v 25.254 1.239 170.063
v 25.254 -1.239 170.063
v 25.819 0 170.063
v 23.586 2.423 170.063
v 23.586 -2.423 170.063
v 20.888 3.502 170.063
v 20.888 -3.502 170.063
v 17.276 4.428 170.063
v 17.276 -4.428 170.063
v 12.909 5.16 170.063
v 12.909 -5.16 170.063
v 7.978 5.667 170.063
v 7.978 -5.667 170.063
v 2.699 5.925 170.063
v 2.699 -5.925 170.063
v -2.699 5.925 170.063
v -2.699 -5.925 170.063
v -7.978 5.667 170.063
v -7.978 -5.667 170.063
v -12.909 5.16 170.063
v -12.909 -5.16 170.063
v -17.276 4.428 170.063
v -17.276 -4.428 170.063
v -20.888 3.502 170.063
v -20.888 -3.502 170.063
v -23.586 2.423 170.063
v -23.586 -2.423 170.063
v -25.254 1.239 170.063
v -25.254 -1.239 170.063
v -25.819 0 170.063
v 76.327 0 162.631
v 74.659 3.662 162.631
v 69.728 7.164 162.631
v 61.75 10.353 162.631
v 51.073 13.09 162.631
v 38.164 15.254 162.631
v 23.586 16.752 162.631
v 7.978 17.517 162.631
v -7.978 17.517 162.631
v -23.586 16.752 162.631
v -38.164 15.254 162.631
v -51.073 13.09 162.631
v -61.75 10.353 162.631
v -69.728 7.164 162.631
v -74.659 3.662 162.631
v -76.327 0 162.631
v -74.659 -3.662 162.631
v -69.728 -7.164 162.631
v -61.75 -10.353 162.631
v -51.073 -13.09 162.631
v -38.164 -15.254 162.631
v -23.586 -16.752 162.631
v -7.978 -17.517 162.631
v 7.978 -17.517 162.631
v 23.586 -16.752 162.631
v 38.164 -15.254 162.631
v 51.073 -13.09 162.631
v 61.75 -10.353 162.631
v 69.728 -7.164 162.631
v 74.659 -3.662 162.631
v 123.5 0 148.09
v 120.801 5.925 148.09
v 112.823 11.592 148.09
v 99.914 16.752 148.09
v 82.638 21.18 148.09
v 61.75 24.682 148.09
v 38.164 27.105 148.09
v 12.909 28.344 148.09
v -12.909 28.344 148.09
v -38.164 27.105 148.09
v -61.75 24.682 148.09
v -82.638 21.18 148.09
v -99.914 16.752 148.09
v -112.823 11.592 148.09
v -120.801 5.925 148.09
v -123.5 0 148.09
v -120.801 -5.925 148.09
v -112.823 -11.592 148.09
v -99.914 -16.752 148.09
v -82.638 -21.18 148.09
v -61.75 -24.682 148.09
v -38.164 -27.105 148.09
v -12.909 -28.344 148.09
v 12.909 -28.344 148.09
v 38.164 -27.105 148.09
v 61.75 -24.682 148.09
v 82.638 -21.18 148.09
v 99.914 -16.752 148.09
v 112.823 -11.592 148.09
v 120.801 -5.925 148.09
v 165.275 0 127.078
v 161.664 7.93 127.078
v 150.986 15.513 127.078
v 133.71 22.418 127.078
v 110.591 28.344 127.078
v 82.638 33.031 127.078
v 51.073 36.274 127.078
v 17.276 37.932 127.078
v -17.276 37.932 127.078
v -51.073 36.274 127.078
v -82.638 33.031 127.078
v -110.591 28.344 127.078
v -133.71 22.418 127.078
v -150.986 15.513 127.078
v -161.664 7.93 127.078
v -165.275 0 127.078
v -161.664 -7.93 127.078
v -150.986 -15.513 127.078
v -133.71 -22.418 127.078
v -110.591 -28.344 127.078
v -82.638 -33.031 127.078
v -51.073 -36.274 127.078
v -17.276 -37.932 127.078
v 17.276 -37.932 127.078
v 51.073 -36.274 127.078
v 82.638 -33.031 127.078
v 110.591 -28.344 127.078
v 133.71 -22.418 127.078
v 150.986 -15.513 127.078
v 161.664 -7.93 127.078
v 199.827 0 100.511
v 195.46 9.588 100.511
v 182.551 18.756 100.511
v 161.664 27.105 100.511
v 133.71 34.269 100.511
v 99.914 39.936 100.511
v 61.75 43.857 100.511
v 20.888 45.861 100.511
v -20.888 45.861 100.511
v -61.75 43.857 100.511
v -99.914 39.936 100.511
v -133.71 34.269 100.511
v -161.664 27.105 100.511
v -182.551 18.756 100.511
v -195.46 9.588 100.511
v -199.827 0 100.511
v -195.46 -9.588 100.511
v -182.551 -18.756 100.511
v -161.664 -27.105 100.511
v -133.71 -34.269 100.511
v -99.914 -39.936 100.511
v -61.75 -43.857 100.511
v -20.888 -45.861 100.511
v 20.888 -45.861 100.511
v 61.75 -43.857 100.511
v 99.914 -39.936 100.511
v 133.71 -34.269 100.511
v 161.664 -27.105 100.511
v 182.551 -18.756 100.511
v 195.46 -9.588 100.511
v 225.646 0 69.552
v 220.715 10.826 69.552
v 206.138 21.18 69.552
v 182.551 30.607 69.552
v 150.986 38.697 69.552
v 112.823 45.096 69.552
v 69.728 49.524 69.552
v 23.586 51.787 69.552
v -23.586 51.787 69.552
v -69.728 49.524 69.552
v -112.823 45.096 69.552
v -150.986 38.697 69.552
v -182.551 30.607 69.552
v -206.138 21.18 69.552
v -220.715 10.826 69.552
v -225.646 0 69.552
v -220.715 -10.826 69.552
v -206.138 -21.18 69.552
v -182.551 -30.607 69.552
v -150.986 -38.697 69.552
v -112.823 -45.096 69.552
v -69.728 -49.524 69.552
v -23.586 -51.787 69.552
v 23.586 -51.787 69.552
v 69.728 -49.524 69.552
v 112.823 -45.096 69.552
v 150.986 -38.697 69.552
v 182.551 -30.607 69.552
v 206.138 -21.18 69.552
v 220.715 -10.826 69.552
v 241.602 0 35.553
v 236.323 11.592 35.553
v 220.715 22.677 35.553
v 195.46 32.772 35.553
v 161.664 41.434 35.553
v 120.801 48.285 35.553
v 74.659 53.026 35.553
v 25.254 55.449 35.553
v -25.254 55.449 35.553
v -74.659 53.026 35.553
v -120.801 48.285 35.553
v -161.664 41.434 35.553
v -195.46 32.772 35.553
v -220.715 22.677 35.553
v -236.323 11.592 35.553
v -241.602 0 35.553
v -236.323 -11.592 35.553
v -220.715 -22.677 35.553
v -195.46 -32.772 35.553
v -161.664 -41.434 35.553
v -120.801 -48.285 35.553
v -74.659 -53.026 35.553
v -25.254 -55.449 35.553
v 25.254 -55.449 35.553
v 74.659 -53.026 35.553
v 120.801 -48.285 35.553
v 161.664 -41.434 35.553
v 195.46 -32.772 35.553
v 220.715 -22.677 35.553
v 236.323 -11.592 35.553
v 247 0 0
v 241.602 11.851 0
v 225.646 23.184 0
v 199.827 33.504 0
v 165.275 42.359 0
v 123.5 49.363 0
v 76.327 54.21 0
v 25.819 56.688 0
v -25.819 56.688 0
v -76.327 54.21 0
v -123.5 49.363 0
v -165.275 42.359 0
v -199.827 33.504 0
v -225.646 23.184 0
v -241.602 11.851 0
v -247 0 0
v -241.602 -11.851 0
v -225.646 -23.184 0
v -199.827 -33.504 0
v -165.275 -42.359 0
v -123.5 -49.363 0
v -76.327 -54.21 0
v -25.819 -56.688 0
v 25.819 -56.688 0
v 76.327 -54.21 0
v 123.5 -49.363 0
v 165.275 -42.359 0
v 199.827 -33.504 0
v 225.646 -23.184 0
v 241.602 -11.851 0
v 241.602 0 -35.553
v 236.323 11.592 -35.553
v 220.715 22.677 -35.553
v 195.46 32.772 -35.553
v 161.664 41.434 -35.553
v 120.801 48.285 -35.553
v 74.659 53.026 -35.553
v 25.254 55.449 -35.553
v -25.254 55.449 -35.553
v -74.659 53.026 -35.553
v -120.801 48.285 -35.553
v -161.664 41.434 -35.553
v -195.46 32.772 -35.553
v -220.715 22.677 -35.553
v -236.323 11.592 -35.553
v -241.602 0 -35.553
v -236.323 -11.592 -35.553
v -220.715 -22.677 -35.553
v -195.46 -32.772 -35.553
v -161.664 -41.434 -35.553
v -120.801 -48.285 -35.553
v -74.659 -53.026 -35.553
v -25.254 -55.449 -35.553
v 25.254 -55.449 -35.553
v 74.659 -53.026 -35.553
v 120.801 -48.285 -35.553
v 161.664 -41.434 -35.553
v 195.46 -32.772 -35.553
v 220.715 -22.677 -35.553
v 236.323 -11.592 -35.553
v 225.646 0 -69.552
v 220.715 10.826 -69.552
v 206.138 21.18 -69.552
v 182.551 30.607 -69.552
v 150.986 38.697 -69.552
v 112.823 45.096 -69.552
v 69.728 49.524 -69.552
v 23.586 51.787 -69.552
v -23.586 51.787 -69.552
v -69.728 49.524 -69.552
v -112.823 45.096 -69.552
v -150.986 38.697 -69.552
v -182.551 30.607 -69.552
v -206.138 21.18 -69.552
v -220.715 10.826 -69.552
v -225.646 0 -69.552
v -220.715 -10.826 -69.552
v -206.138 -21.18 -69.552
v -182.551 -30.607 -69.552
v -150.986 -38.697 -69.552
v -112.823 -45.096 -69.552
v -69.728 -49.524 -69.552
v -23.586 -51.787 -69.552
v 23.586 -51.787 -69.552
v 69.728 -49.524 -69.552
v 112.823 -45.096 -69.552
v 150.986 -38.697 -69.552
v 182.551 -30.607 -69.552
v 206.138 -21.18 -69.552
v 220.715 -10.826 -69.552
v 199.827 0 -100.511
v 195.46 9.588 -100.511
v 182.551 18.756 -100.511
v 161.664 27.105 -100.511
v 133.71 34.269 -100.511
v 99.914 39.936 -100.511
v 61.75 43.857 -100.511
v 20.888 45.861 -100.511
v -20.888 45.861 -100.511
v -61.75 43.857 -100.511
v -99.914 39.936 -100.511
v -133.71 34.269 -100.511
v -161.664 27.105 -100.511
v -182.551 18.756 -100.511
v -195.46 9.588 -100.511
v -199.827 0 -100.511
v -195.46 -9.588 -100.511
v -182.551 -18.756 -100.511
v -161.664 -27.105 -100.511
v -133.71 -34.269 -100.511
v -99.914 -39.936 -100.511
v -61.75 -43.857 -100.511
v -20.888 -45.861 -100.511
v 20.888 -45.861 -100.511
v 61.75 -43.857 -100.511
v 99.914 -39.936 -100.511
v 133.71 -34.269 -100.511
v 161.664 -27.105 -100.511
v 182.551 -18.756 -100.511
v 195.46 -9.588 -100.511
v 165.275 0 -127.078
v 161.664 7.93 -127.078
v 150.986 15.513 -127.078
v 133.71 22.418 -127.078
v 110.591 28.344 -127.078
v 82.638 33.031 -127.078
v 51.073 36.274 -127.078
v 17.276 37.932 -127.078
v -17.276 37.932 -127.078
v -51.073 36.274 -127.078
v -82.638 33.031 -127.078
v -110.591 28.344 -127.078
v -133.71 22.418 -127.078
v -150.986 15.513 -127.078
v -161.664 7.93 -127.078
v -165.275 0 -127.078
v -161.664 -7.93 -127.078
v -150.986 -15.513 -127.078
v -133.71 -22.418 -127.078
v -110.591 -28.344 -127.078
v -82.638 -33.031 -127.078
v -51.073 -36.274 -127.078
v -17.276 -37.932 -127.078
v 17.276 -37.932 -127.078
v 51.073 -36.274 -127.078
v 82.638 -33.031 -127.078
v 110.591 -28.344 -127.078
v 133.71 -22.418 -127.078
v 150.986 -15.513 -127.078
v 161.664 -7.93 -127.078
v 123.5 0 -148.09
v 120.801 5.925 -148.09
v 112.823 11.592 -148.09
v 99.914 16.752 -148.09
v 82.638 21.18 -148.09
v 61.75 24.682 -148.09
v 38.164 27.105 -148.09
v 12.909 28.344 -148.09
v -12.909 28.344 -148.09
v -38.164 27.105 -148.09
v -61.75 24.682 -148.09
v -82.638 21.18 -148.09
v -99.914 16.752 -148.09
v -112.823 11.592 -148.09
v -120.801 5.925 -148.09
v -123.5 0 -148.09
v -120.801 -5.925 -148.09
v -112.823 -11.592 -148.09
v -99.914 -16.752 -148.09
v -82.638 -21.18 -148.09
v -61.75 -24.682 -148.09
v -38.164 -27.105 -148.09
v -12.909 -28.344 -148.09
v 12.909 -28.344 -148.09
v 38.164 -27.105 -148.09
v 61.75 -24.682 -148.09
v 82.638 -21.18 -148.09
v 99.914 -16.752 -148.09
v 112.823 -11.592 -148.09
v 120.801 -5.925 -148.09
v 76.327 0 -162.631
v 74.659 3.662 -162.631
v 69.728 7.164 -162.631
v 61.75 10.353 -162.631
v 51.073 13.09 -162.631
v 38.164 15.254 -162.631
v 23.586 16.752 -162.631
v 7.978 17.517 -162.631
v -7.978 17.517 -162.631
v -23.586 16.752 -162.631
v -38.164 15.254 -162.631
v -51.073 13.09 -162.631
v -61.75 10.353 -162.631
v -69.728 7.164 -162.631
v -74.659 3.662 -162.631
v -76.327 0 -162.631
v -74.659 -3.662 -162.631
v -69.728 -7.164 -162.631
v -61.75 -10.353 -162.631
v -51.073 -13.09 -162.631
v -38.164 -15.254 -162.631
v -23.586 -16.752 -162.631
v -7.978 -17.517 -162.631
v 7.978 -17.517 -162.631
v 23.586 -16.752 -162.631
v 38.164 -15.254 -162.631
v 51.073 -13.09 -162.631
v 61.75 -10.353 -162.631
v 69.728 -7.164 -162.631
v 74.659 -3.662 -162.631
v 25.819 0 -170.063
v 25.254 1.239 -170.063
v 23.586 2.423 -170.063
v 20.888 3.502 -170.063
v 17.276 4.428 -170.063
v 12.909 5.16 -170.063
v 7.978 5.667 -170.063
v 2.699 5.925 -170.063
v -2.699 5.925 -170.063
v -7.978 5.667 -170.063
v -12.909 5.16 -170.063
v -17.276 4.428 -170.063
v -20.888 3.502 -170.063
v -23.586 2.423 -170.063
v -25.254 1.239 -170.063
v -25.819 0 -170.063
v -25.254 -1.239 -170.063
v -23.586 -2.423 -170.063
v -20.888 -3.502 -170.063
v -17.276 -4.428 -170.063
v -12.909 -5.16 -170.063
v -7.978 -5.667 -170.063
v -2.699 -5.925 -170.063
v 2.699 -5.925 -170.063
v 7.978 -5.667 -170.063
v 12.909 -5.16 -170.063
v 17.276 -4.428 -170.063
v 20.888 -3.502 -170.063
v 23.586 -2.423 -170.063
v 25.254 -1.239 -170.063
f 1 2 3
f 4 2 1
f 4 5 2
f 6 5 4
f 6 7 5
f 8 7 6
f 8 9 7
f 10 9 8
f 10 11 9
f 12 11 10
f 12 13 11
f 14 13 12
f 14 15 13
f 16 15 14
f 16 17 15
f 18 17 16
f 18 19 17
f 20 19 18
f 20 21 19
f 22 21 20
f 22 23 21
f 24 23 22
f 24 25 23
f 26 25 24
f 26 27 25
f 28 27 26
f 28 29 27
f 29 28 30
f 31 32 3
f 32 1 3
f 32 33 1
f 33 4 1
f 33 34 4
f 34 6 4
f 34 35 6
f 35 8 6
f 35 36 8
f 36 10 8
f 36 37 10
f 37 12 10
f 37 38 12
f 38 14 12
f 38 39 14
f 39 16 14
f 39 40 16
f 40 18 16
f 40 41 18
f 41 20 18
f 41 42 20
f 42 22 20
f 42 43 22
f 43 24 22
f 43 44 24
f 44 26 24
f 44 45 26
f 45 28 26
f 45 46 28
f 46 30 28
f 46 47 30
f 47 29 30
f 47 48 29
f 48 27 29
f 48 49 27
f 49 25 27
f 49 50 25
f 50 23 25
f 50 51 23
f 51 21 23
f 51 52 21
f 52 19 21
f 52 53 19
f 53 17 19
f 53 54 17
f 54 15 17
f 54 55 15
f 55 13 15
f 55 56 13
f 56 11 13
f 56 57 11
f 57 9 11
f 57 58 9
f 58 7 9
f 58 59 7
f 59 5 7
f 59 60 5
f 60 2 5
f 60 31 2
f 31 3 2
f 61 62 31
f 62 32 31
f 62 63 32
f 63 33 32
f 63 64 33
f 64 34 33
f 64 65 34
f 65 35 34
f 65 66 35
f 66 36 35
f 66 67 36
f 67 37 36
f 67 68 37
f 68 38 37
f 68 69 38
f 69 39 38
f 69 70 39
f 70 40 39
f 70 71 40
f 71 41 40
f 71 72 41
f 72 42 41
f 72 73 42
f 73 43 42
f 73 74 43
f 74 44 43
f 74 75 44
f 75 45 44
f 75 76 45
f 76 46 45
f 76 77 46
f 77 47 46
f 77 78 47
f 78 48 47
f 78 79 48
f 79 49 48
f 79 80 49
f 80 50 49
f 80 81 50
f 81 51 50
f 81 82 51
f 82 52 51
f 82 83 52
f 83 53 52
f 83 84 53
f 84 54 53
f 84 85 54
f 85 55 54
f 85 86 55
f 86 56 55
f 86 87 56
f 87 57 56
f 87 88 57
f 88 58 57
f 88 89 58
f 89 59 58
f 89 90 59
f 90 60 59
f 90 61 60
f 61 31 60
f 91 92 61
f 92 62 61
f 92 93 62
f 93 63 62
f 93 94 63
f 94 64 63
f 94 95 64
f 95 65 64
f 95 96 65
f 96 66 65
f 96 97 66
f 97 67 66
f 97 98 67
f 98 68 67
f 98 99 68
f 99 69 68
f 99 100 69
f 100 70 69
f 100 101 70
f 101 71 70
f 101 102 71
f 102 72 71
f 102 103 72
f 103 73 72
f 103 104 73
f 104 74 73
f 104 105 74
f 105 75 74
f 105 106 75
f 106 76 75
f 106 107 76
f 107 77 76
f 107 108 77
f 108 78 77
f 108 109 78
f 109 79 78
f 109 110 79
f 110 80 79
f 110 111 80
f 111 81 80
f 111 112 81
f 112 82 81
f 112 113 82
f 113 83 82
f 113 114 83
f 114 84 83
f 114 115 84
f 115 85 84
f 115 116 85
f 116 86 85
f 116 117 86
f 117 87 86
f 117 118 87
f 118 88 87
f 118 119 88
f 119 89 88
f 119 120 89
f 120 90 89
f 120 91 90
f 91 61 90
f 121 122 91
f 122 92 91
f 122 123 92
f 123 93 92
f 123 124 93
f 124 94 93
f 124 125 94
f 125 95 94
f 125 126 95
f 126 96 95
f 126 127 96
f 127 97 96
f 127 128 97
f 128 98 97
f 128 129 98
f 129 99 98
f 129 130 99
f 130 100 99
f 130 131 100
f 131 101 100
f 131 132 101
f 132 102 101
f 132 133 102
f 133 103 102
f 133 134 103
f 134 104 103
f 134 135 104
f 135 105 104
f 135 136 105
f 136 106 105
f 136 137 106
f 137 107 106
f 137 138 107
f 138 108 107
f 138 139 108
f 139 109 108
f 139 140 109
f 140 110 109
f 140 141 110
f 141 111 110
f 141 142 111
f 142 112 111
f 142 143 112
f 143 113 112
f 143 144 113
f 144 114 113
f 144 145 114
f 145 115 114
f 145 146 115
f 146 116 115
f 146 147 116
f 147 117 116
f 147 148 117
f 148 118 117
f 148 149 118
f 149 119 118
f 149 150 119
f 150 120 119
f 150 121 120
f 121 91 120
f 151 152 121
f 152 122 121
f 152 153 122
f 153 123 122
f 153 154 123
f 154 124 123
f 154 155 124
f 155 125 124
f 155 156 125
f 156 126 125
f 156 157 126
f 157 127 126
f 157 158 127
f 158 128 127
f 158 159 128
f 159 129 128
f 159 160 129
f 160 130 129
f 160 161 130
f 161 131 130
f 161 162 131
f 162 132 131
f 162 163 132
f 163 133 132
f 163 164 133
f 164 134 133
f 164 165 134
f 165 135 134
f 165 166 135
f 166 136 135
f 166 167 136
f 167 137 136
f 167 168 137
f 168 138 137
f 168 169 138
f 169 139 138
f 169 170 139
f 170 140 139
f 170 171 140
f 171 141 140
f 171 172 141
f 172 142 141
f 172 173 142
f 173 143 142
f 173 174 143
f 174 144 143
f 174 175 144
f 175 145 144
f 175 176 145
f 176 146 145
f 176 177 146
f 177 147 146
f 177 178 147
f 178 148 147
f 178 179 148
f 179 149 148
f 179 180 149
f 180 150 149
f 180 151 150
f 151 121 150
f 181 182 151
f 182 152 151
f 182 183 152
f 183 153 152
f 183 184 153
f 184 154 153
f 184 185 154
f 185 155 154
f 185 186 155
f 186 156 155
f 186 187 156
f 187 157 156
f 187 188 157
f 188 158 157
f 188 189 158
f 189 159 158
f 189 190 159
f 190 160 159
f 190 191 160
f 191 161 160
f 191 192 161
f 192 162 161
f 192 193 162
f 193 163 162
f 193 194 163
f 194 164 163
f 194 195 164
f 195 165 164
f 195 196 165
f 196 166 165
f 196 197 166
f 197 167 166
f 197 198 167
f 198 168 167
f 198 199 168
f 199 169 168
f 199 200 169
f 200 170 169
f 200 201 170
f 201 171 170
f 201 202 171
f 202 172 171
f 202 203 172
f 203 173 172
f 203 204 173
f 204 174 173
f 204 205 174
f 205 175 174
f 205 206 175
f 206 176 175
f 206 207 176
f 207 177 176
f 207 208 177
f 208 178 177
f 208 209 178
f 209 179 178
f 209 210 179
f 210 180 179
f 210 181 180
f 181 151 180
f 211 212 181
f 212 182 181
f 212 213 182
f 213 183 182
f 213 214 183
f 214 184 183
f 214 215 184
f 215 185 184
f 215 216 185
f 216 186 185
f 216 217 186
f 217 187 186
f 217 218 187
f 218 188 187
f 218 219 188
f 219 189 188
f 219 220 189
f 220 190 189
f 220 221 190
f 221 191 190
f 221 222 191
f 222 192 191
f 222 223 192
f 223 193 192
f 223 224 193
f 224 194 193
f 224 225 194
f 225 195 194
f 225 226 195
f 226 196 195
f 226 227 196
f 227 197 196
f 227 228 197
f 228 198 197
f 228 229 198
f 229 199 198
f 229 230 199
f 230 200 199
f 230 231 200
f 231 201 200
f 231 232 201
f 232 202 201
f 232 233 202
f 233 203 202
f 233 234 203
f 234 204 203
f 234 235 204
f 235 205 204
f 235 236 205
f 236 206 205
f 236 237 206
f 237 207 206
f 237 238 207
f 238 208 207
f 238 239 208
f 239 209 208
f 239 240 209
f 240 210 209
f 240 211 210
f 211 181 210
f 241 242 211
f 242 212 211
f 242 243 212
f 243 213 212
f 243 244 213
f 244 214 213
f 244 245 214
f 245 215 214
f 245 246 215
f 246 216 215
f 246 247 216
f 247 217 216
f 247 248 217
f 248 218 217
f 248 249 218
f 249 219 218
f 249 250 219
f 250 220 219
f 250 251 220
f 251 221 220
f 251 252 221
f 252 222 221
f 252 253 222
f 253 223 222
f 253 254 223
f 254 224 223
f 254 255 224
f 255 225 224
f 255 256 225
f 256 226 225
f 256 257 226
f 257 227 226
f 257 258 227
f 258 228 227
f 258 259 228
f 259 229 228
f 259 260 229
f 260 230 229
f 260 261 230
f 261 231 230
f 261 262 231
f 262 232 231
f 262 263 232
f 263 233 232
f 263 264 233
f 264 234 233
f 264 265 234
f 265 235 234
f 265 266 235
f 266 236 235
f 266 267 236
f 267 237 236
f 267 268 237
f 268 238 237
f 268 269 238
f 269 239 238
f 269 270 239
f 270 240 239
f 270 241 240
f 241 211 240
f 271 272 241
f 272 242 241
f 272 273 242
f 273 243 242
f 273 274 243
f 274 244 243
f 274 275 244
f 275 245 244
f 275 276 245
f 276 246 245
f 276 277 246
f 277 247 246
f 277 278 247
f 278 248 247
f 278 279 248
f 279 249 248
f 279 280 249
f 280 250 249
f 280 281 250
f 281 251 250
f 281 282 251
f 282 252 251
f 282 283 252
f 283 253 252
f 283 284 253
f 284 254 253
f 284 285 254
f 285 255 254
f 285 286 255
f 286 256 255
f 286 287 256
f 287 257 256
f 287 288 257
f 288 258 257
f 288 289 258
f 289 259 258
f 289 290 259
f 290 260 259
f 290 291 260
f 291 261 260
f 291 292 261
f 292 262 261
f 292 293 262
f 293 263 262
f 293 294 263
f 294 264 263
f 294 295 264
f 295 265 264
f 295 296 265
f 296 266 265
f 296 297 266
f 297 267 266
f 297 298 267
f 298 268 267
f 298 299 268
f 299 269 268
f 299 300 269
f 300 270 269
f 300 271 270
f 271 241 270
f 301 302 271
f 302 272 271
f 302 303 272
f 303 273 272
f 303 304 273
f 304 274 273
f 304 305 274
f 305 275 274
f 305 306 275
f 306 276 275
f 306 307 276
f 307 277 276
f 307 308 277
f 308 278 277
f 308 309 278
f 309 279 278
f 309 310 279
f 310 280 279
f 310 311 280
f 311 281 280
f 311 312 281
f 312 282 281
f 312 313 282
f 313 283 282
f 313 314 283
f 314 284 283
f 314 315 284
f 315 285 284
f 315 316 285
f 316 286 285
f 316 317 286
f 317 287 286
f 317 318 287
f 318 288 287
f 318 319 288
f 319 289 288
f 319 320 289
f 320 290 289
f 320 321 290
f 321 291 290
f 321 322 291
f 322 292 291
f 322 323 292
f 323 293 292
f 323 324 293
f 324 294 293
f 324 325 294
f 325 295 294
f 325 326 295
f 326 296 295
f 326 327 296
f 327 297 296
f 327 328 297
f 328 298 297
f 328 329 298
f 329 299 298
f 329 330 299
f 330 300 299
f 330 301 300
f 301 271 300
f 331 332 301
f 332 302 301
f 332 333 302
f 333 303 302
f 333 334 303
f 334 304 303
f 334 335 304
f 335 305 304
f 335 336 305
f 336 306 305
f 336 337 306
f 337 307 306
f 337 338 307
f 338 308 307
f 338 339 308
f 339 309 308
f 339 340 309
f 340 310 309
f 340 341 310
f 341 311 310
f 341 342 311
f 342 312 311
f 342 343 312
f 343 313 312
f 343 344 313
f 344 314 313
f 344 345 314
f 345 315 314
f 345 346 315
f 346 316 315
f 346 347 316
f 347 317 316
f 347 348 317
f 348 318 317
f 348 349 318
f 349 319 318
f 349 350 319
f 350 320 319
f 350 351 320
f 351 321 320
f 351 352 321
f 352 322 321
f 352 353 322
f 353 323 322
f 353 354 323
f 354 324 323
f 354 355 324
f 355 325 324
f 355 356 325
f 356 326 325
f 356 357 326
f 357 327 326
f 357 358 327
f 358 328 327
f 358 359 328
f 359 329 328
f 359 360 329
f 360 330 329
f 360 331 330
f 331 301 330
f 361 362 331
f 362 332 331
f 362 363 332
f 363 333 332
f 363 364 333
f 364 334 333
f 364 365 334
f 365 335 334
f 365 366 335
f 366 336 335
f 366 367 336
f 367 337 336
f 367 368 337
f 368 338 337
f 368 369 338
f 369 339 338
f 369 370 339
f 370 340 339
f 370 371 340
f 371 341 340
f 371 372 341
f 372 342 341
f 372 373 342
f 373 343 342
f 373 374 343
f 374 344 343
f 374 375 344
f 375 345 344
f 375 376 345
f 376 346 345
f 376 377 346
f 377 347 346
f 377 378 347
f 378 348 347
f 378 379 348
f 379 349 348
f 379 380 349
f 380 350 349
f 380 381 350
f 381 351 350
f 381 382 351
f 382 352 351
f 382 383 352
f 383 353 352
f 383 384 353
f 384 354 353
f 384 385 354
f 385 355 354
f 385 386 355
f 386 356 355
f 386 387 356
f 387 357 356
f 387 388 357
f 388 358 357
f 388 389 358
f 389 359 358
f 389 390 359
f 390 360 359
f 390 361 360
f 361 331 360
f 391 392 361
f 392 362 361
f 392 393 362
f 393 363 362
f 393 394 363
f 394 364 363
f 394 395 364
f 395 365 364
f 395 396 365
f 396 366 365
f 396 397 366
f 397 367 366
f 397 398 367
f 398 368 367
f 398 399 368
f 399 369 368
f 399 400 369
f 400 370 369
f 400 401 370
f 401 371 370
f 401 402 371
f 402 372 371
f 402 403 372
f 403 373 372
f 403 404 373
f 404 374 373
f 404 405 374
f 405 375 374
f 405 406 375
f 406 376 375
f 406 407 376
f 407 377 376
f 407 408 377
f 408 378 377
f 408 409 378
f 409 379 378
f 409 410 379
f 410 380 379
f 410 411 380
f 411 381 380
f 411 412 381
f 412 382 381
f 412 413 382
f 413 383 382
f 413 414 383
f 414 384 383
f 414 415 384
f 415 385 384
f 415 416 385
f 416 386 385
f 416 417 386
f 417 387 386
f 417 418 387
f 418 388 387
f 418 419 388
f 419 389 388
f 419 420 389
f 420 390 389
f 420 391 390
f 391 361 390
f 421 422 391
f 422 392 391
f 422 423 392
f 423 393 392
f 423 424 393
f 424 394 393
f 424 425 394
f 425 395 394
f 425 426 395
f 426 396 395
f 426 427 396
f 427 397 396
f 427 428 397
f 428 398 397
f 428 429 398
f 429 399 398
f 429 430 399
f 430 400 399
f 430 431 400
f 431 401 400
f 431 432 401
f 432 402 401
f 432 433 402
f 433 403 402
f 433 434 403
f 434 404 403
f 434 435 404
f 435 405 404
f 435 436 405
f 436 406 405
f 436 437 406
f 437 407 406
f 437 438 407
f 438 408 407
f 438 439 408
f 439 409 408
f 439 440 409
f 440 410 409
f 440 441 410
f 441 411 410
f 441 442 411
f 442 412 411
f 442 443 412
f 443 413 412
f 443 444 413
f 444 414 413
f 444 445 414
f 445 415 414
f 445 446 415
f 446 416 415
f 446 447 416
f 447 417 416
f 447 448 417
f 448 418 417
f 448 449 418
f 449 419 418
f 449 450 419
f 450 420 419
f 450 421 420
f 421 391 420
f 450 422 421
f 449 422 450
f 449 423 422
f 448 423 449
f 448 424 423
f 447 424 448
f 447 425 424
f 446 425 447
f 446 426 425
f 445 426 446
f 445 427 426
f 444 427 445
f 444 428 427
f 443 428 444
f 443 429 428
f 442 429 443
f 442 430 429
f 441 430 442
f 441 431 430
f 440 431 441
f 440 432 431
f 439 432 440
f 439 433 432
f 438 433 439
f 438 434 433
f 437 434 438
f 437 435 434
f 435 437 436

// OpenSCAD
// Generated by SolidPython 1.0.1 on 2020-07-29 00:46:50


scale(v = [13, 3, 9]) {
	sphere(r = 19);
}
/***********************************************
*********      SolidPython code:      **********
************************************************
 
# import packages: SolidPython
from solid import *
from solid.utils import *
from itertools import chain, combinations, permutations


class Resize:

    def __init__(self, scad_file):
        self.scad_file = scad_file
        #self.scad_file = import_scad(scad_file)
        # cone/cylinder param:
        self.r1 = 0
        self.r2 = 0
        self.h = 0
        # rectangular prism param:
        self.w = 0
        self.l = 0
        # ellipse param:
        self.r = 0

    # import OpenScad code (file name corresponds to shape)


    # classify shape + parameters
    def assign(self, param1, param2, param3):
        if self.scad_file == 'cone.scad':
            self.r1 = param1
            self.r2 = param2
            self.h = param3
        elif self.scad_file == 'cylinder.scad':
            self.r1 = param1
            self.r2 = param2
            self.h = param3
        elif self.scad_file == 'rectangularPrism.scad':
            self.h = param1
            self.l = param2
            self.w = param3
        else:
            self.r = param1
            self.h = param2

    # resize parameters
    def iterate(self):
        x = range(3, 20, 2)
        i = 1
        if self.scad_file == 'cone.scad':
            tempList = list(permutations(x, 2))
            for temp in tempList:
                param1 = temp[0]
                param2 = temp[1]
                filepath = 'produced_scad_files/' + 'cone' + str(param1) + '_' + str(param2) + '_' + '.scad'
                scad_render_to_file(cylinder(h=param1, r1=param2, r2=0), filepath)

        elif self.scad_file == 'cylinder.scad':
            tempList = list(permutations(x, 3))
            for temp in tempList:
                param1 = temp[0]
                param2 = temp[1]
                filepath = 'produced_scad_files/' + 'cylinder' + str(param1) + '_' + str(param2) + '_' + '.scad'
                scad_render_to_file(cylinder(h=param1, r1=param2, r2=param2), filepath)

        elif self.scad_file == 'rectangularPrism.scad':
            tempList = list(permutations(x, 3))
            for temp in tempList:
                param1 = temp[0]
                param2 = temp[1]
                param3 = temp[2]
                filepath = 'produced_scad_files/' + 'rectangularPrism' + str(param1) + '_' + str(param2) + '_' + str(
                    param3) + '.scad'
                scad_render_to_file(cube(size=(param1, param2, param3)), filepath)

        elif self.scad_file == 'ellipse.scad':
            tempList = list(permutations(x, 4))
            for temp in tempList:
                param1 = temp[0]
                param2 = temp[1]
                param3 = temp[2]
                param4 = temp[3]
                filepath = 'produced_scad_files/' + 'ellipse' + str(param1) + '_' + str(param2) + '_' + str(param3) + '_' + str(param4) + '.scad'
                scad_render_to_file(scale([param1, param2, param3])(sphere(r=param4)), filepath)

    def render_to_scadfile(self):
        scad_render_to_file(scad, 'example.scad') 
 
************************************************/
